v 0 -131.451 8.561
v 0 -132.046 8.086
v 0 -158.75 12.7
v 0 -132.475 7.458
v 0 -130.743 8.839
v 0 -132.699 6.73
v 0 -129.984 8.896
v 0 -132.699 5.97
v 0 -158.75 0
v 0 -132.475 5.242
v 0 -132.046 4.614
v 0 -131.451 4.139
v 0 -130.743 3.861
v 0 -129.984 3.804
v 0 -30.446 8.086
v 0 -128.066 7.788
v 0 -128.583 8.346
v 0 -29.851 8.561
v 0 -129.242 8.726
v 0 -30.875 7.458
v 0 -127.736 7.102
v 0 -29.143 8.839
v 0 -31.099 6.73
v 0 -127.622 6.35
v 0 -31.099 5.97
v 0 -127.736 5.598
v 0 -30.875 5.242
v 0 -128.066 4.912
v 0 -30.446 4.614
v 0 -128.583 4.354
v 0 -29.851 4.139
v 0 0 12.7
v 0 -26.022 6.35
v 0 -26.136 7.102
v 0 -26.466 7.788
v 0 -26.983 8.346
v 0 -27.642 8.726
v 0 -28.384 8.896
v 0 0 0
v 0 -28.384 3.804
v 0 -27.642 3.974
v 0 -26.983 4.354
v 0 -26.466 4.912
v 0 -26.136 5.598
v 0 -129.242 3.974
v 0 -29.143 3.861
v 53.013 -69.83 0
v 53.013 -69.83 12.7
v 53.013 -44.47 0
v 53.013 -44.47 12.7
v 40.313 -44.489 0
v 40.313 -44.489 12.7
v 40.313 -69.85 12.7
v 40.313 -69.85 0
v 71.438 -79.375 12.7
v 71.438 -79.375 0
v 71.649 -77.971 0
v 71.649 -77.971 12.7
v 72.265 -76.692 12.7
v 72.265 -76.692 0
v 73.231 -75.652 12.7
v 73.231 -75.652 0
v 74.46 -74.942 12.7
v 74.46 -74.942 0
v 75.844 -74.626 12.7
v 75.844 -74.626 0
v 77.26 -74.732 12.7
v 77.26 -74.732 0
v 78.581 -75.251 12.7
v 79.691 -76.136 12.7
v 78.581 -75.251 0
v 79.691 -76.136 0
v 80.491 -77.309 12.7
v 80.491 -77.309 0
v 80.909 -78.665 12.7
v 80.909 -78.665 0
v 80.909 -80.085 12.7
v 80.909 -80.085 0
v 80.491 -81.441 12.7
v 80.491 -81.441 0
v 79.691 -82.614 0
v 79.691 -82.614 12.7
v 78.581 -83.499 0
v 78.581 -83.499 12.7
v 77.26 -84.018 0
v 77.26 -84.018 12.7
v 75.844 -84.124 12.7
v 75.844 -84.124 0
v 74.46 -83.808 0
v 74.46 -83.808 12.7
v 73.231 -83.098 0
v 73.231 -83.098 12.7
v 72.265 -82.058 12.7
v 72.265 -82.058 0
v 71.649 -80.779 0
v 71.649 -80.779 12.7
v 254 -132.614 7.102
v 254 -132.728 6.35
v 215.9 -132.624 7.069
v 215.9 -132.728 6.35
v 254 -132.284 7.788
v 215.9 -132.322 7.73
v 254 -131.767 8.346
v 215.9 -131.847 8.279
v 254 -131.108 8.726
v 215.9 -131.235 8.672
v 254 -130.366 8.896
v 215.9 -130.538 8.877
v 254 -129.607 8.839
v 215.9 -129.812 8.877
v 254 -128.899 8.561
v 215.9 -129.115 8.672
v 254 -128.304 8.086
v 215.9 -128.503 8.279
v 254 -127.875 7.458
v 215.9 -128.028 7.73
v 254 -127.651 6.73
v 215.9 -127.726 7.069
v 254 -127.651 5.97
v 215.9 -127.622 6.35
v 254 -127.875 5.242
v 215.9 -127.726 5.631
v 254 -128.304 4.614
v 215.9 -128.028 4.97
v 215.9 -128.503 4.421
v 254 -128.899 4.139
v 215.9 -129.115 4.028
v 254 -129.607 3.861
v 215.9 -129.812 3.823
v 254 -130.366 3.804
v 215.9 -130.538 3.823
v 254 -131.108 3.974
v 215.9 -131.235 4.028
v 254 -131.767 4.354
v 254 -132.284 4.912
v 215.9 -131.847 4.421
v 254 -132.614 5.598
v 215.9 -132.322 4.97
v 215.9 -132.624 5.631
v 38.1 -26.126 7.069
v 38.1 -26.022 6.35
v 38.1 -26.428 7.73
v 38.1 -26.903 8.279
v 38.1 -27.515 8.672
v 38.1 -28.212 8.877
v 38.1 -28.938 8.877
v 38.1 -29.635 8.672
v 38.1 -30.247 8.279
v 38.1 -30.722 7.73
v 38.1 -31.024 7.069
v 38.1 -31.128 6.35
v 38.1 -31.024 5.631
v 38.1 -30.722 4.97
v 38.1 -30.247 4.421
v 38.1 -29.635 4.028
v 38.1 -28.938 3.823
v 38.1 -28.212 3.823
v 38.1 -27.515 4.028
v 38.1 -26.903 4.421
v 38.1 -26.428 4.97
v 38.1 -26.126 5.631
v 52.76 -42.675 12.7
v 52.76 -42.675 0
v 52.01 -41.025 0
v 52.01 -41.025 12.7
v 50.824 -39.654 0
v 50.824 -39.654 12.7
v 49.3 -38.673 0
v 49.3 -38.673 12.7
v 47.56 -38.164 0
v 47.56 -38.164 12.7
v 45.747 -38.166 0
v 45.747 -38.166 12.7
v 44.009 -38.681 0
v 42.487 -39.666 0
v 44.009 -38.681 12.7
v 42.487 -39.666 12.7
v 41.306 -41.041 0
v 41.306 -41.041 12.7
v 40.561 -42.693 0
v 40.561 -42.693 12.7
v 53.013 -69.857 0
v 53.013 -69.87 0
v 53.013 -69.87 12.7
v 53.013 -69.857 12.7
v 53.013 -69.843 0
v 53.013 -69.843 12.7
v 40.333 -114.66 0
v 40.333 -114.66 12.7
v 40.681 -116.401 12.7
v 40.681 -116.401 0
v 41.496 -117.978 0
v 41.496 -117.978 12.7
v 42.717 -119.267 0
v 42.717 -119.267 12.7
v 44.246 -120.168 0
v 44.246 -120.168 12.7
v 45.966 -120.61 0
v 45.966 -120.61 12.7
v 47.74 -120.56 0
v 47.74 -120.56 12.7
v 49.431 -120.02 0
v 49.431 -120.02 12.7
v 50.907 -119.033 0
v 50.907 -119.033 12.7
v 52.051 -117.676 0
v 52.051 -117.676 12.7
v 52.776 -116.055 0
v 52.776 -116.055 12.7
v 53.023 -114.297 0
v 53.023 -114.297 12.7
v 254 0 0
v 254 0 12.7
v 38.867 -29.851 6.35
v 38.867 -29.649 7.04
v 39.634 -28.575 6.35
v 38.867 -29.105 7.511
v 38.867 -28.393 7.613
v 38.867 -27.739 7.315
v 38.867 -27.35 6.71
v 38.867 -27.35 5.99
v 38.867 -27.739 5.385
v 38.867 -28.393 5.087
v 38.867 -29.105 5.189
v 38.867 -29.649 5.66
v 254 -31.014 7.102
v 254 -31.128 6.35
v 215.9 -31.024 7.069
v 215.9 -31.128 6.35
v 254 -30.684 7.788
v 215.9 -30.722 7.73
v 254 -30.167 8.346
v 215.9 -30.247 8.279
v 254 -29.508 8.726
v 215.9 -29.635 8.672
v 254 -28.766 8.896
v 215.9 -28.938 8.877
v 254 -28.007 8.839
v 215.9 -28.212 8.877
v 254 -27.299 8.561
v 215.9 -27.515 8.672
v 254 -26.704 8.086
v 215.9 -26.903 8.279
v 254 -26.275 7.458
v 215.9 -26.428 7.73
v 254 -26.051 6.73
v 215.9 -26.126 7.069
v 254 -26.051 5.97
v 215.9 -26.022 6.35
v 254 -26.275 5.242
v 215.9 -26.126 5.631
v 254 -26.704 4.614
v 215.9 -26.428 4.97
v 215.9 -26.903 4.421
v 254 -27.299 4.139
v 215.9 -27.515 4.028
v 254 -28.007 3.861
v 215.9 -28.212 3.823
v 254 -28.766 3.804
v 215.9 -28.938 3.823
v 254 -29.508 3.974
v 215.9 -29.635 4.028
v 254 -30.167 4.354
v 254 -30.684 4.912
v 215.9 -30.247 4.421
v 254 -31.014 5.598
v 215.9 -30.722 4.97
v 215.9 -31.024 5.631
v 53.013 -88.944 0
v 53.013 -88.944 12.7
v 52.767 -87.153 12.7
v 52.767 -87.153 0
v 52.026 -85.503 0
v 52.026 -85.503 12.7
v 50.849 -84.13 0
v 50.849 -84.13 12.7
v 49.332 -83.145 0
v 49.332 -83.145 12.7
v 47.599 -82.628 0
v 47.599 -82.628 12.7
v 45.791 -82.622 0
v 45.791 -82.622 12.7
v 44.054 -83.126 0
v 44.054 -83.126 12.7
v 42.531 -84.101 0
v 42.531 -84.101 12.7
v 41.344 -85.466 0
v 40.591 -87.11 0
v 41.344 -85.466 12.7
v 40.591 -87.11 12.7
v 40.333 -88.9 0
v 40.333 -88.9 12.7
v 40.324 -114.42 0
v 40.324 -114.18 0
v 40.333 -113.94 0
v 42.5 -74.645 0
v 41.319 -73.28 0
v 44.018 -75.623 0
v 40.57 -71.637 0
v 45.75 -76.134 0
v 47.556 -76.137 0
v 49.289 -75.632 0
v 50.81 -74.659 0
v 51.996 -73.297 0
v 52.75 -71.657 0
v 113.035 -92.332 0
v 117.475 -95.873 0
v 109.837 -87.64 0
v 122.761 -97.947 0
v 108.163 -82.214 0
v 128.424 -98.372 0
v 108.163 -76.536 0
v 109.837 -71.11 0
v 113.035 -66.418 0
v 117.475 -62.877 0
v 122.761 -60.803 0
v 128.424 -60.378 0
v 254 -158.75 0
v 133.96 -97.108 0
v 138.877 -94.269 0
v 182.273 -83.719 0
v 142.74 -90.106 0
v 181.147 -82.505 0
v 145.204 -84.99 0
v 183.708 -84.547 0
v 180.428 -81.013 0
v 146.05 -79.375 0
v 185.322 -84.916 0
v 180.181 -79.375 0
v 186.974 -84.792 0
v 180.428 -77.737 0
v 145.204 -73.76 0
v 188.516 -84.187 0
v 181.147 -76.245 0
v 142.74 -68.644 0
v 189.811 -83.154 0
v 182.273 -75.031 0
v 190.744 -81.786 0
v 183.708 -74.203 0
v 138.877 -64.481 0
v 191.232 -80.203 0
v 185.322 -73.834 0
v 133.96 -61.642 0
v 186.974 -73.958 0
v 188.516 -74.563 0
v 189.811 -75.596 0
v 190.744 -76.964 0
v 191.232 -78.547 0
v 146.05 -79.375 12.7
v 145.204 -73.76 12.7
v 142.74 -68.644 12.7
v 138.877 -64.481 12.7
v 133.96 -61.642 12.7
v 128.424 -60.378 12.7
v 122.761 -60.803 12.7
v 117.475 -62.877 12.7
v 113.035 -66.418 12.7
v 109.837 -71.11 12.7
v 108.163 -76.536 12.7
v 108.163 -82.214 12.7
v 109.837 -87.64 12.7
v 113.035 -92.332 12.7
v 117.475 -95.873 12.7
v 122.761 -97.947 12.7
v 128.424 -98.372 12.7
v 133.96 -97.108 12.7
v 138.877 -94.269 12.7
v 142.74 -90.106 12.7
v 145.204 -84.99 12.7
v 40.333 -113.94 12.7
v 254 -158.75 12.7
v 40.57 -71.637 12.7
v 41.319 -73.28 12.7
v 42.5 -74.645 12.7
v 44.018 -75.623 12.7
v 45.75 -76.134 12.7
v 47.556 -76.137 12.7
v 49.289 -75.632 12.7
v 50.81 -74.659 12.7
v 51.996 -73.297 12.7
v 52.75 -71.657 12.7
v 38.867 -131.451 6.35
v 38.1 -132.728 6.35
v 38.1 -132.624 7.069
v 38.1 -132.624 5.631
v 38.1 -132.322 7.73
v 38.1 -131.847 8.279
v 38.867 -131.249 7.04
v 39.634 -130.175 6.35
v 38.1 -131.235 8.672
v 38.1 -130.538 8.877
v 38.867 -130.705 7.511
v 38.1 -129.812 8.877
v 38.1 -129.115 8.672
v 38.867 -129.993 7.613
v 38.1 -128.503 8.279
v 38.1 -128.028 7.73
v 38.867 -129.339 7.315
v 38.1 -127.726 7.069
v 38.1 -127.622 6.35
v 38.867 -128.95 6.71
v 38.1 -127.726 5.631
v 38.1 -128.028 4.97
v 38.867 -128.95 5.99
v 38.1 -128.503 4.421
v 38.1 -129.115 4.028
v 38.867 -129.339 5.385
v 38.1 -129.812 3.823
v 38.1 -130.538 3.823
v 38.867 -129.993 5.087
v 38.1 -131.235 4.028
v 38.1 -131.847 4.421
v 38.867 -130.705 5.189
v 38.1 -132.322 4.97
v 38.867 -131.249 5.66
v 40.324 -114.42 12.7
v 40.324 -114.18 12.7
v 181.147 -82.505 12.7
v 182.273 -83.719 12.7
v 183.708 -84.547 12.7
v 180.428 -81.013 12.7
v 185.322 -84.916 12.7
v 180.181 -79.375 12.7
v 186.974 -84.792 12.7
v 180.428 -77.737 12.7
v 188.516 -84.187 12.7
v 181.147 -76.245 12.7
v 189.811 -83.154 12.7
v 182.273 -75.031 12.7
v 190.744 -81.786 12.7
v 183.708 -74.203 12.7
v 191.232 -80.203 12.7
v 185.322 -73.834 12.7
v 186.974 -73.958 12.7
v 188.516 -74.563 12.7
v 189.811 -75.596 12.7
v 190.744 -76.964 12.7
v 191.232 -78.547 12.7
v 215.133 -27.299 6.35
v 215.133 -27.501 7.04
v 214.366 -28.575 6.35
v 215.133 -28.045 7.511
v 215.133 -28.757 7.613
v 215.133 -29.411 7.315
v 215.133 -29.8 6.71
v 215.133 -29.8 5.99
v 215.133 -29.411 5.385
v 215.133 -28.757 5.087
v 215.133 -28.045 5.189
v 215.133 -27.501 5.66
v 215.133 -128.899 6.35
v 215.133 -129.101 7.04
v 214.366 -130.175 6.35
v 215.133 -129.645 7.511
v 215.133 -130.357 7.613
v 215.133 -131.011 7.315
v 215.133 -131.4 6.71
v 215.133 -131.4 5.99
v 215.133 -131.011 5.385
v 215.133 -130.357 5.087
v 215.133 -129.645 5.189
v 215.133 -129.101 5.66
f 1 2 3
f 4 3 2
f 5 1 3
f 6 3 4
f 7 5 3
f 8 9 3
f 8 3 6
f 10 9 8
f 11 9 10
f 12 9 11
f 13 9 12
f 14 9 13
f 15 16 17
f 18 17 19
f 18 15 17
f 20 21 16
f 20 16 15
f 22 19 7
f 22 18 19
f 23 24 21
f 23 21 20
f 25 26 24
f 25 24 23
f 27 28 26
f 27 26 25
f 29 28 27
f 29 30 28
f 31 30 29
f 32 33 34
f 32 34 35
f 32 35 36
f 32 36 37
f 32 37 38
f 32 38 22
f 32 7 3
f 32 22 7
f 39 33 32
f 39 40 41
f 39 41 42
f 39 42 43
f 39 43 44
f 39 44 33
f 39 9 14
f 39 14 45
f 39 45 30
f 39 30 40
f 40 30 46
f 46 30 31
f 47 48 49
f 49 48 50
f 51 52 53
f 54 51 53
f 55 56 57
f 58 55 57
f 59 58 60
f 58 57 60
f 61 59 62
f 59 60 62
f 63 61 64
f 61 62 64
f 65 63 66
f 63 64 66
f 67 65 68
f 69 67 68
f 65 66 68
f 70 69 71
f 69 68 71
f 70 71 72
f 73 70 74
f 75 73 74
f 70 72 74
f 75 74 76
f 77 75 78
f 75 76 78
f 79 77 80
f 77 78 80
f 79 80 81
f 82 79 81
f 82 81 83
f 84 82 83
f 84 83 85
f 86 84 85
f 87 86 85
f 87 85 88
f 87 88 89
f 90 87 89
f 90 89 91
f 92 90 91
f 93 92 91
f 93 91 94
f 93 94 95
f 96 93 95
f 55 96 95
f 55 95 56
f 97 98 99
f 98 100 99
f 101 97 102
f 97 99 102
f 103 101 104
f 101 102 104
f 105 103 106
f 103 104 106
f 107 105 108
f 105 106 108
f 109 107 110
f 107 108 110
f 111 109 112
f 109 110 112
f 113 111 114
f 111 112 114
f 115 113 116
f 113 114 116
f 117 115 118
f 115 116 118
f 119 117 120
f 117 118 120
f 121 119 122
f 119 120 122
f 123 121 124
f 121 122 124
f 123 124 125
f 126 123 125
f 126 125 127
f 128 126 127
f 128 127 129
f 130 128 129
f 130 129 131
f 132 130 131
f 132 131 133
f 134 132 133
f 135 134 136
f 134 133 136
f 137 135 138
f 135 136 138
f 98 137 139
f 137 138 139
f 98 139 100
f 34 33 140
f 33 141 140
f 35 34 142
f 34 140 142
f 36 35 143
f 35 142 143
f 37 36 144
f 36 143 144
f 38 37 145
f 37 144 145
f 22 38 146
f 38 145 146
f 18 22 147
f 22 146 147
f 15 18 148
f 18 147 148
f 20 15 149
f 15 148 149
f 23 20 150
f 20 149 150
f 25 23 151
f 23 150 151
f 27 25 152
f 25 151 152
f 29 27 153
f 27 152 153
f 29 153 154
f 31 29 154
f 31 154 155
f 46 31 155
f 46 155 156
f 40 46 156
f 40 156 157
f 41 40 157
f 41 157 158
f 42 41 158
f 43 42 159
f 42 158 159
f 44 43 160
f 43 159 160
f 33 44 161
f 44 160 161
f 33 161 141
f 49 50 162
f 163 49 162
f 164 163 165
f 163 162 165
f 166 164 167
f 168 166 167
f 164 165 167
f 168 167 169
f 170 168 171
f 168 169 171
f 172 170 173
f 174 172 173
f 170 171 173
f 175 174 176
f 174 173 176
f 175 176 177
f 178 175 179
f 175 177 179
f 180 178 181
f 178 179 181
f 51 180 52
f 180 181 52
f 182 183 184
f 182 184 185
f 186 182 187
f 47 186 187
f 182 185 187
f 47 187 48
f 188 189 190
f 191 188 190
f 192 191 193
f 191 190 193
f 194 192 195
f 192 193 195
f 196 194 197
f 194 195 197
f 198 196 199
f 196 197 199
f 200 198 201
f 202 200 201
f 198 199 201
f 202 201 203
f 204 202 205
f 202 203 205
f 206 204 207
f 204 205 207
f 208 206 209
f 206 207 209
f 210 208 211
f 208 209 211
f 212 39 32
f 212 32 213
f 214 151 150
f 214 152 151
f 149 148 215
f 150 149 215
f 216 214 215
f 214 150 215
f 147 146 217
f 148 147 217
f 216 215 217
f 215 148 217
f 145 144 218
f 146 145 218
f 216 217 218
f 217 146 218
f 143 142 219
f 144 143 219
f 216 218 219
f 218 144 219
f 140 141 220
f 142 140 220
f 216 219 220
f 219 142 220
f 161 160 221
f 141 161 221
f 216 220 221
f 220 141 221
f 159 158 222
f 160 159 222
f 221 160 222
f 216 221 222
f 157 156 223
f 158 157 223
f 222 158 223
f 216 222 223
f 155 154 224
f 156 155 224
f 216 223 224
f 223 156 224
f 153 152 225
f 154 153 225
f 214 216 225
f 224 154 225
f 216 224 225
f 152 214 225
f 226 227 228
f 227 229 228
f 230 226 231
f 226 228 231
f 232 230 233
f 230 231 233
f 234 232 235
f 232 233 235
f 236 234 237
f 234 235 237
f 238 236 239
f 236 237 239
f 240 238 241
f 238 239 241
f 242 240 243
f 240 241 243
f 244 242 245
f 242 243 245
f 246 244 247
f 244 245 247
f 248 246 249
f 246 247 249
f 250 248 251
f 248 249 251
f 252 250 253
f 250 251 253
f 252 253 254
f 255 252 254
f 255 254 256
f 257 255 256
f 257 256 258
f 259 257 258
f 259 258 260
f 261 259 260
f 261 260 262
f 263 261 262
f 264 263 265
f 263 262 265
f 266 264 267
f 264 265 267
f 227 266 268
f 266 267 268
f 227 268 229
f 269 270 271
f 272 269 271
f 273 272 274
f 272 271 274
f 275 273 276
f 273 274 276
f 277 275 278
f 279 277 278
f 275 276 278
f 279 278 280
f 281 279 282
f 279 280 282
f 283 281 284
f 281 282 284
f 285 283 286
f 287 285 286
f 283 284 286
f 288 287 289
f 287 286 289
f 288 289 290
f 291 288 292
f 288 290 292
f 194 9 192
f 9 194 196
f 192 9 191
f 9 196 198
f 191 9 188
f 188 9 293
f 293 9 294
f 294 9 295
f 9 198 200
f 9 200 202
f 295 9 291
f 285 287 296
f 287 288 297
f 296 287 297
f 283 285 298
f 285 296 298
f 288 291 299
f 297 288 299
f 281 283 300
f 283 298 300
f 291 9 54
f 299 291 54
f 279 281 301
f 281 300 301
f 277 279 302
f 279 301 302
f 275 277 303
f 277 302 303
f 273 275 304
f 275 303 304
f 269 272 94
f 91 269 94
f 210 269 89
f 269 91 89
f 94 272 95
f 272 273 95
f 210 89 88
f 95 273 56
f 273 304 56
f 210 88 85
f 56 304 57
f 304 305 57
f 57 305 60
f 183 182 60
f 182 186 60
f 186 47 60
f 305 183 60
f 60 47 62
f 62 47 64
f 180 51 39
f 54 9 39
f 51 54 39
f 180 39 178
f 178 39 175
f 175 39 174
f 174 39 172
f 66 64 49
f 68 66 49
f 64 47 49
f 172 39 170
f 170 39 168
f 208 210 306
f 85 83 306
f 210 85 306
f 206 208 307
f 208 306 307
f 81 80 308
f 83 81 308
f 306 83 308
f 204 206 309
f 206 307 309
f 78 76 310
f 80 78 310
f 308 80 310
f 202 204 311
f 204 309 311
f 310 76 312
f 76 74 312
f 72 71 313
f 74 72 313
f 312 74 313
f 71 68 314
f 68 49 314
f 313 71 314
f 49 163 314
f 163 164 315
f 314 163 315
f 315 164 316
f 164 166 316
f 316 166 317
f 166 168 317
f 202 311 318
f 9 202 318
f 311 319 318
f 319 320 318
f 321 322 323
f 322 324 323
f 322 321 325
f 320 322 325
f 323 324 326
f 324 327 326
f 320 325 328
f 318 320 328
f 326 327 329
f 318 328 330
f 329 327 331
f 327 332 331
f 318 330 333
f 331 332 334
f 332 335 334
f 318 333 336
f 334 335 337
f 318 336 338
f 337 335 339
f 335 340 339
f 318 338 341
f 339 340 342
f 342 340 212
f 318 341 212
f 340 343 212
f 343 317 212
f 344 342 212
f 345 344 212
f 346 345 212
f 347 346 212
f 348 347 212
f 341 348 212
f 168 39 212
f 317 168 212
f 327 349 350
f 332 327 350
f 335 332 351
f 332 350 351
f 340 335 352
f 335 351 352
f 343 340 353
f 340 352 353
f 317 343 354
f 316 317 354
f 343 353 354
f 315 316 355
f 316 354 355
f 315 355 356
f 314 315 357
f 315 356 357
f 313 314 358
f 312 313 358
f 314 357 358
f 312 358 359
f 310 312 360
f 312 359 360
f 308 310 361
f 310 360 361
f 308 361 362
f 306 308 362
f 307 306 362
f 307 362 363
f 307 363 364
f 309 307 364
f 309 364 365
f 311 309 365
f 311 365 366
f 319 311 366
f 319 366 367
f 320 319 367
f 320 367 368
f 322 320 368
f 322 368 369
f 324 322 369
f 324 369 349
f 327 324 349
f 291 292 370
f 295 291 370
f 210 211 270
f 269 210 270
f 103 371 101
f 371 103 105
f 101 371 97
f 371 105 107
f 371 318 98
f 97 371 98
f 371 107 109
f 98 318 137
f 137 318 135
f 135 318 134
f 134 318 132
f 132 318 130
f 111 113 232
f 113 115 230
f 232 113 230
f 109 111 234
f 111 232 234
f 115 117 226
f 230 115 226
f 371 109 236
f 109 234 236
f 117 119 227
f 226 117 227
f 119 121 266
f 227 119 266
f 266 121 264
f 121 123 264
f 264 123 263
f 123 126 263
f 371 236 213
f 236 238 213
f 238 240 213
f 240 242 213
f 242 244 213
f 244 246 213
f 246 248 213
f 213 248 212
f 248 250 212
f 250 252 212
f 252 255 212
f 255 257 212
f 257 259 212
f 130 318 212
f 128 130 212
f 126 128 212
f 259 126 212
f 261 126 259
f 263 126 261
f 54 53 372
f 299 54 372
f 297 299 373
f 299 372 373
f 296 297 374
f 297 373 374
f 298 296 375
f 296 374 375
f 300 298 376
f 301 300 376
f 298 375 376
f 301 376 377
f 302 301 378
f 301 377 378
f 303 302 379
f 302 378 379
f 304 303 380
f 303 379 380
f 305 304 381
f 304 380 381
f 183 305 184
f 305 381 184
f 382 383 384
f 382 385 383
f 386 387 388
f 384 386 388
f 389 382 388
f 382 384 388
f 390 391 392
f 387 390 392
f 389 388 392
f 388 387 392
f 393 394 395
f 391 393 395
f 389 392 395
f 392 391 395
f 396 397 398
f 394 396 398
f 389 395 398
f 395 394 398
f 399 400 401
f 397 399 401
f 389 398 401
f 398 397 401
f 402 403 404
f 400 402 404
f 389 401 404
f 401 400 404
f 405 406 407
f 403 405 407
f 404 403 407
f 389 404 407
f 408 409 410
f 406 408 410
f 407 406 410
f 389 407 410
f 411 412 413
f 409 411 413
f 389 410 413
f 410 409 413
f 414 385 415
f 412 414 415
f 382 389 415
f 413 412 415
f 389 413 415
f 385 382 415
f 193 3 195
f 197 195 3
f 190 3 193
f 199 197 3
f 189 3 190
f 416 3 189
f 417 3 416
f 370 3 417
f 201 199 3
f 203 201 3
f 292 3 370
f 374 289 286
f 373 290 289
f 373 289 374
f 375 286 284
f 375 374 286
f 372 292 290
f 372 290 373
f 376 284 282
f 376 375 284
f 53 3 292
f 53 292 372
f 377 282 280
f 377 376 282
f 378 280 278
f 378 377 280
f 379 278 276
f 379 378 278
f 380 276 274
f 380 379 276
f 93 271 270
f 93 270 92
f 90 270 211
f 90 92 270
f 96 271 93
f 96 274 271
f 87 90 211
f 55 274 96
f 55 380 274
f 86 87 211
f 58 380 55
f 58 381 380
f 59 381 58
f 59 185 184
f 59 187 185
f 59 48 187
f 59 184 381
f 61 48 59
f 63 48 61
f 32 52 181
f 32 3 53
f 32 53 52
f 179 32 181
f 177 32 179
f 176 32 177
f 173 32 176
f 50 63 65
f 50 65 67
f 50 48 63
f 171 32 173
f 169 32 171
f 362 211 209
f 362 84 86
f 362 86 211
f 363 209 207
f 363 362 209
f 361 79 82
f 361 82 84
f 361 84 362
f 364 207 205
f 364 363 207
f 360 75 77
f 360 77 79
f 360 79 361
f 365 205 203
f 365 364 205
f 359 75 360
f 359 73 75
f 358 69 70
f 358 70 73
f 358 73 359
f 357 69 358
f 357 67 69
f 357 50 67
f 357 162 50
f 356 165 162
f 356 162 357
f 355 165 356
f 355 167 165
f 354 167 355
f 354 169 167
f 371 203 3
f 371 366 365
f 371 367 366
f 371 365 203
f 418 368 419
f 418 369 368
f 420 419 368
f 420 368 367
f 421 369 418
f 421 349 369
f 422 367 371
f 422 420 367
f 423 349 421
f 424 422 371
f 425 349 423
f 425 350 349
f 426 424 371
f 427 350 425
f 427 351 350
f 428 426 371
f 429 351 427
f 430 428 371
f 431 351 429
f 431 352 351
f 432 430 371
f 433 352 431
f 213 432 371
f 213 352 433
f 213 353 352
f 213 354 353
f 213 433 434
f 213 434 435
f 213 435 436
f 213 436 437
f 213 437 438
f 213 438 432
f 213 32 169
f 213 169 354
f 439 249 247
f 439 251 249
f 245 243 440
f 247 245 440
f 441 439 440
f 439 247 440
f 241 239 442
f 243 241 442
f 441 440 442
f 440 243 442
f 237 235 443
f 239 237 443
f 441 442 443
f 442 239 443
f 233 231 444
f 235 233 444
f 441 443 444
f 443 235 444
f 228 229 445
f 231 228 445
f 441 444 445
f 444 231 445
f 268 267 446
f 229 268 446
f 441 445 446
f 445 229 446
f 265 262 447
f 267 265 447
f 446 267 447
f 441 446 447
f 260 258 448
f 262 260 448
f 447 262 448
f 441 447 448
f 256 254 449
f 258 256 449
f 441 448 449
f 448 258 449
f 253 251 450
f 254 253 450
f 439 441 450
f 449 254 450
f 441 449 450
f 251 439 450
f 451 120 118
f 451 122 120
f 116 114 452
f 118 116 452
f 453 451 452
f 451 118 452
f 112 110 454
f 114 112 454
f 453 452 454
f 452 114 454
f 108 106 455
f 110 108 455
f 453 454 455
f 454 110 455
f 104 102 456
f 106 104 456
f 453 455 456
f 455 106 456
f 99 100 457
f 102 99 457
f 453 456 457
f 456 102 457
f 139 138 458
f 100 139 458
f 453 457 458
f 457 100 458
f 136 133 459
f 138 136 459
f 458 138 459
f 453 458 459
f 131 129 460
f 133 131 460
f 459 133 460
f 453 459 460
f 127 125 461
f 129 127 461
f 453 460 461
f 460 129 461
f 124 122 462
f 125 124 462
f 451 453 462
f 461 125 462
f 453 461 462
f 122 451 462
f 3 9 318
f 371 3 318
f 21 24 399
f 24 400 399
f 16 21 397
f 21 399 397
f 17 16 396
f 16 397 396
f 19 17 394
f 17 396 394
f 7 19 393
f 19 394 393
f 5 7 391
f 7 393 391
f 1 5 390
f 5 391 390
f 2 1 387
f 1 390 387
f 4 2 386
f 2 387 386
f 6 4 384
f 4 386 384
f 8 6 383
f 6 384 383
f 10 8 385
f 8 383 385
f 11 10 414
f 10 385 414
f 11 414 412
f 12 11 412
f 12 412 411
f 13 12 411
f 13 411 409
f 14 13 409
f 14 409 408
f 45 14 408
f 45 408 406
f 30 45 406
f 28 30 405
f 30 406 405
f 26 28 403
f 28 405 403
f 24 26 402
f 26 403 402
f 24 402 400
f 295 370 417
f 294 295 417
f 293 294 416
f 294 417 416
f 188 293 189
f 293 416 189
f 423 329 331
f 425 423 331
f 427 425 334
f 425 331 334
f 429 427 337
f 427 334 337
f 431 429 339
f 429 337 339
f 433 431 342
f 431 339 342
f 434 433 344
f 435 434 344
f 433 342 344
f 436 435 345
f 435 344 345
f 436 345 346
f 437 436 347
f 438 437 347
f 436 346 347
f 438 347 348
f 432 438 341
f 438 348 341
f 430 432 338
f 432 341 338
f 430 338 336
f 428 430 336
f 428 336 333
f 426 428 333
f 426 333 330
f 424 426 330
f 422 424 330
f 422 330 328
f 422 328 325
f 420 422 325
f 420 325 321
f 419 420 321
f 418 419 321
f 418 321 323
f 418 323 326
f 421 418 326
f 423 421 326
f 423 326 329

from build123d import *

# Parameters (mm, degrees)
F0_W      = 254
F0_H      = 158.75
F1_DEPTH  = 12.7
F2_R      = 19.05
F3_DEPTH  = 12.701
F5_D      = 5.1054
F5_DEPTH  = 38.1
F5_TIP    = 1.5338169022
F7_D      = 5.1054
F7_DEPTH  = 38.1
F7_TIP    = 1.5338169022
F9_D      = 9.525
F11_D     = 11.1125
F13_DEPTH = 12.701
F15_DEPTH = 12.701


with BuildPart() as f1:
    # F0 (on Top) → F1 (new body)
    with BuildSketch(Plane.XY):
        with Locations((127, -79.375)):
            Rectangle(F0_W, F0_H)
    extrude(amount=F1_DEPTH)

    # F2 (on face) → F3 (cut, through all)
    with BuildSketch(Plane.XY.offset(12.7)):
        with Locations((127, -79.375)):
            Circle(F2_R)
    extrude(amount=-F3_DEPTH, mode=Mode.SUBTRACT)

    # F5
    with Locations(Plane.YZ.offset(254)):
        with Locations((-28.575, 6.35), (-130.175, 6.35)):
            Hole(F5_D / 2, depth=F5_DEPTH)
            with Locations((0, 0, -(F5_DEPTH + F5_TIP / 2))):  # 118° drill point
                Cone(0, F5_D / 2, F5_TIP, mode=Mode.SUBTRACT)

    # F7
    with Locations(Plane(origin=(0, 0, 0), x_dir=(0, -1, 0), z_dir=(-1, 0, 0))):
        with Locations((28.575, 6.35), (130.175, 6.35)):
            Hole(F7_D / 2, depth=F7_DEPTH)
            with Locations((0, 0, -(F7_DEPTH + F7_TIP / 2))):  # 118° drill point
                Cone(0, F7_D / 2, F7_TIP, mode=Mode.SUBTRACT)

    # F9 (through all)
    with Locations(Plane.XY.offset(12.7)):
        with Locations((76.2, -79.375)):
            Hole(F9_D / 2)

    # F11 (through all)
    with Locations(Plane.XY.offset(12.7)):
        with Locations((185.7375, -79.375)):
            Hole(F11_D / 2)

    # F12 (on face) → F13 (cut, through all)
    with BuildSketch(Plane.XY.offset(12.7)):
        with BuildLine():
            Line((40.3130046014, -44.4888598491), (40.3128856958, -69.849970228))
            ThreePointArc((40.3128856958, -69.849970228), (46.6526663673, -76.1999917768), (53.0128528986, -69.8704088586))
            ThreePointArc((53.0128528986, -69.8704088586), (53.0128856957, -69.85), (53.0128528986, -69.8295911414))
            Line((53.0128528986, -69.8295911414), (53.0128528986, -44.4704088586))
            ThreePointArc((53.0128528986, -44.4704088586), (46.6536601, -38.1000067017), (40.3130046014, -44.4888598491))
        make_face()
    extrude(amount=-F13_DEPTH, mode=Mode.SUBTRACT)

    # F14 (on face) → F15 (cut, through all)
    with BuildSketch(Plane.XY.offset(12.7)):
        with BuildLine():
            Line((53.0230747203, -114.2974009173), (53.0126976141, -88.9443724583))
            ThreePointArc((53.0126976141, -88.9443724583), (46.6952616172, -82.5602611748), (40.3332976057, -88.9))
            Line((40.3332976057, -88.9), (40.3332976057, -113.9398342138))
            Line((40.3332976057, -113.9398342138), (40.3332976057, -114.6601657862))
            ThreePointArc((40.3332976057, -114.6601657862), (46.8545296788, -120.647406895), (53.0230747203, -114.2974009173))
        make_face()
        with BuildLine():
            Line((40.3332976057, -114.6601657862), (40.3332976057, -113.9398342138))
            ThreePointArc((40.3332976057, -113.9398342138), (40.3230752522, -114.3), (40.3332976057, -114.6601657862))
        make_face()
    extrude(amount=-F15_DEPTH, mode=Mode.SUBTRACT)


solid = f1.part
